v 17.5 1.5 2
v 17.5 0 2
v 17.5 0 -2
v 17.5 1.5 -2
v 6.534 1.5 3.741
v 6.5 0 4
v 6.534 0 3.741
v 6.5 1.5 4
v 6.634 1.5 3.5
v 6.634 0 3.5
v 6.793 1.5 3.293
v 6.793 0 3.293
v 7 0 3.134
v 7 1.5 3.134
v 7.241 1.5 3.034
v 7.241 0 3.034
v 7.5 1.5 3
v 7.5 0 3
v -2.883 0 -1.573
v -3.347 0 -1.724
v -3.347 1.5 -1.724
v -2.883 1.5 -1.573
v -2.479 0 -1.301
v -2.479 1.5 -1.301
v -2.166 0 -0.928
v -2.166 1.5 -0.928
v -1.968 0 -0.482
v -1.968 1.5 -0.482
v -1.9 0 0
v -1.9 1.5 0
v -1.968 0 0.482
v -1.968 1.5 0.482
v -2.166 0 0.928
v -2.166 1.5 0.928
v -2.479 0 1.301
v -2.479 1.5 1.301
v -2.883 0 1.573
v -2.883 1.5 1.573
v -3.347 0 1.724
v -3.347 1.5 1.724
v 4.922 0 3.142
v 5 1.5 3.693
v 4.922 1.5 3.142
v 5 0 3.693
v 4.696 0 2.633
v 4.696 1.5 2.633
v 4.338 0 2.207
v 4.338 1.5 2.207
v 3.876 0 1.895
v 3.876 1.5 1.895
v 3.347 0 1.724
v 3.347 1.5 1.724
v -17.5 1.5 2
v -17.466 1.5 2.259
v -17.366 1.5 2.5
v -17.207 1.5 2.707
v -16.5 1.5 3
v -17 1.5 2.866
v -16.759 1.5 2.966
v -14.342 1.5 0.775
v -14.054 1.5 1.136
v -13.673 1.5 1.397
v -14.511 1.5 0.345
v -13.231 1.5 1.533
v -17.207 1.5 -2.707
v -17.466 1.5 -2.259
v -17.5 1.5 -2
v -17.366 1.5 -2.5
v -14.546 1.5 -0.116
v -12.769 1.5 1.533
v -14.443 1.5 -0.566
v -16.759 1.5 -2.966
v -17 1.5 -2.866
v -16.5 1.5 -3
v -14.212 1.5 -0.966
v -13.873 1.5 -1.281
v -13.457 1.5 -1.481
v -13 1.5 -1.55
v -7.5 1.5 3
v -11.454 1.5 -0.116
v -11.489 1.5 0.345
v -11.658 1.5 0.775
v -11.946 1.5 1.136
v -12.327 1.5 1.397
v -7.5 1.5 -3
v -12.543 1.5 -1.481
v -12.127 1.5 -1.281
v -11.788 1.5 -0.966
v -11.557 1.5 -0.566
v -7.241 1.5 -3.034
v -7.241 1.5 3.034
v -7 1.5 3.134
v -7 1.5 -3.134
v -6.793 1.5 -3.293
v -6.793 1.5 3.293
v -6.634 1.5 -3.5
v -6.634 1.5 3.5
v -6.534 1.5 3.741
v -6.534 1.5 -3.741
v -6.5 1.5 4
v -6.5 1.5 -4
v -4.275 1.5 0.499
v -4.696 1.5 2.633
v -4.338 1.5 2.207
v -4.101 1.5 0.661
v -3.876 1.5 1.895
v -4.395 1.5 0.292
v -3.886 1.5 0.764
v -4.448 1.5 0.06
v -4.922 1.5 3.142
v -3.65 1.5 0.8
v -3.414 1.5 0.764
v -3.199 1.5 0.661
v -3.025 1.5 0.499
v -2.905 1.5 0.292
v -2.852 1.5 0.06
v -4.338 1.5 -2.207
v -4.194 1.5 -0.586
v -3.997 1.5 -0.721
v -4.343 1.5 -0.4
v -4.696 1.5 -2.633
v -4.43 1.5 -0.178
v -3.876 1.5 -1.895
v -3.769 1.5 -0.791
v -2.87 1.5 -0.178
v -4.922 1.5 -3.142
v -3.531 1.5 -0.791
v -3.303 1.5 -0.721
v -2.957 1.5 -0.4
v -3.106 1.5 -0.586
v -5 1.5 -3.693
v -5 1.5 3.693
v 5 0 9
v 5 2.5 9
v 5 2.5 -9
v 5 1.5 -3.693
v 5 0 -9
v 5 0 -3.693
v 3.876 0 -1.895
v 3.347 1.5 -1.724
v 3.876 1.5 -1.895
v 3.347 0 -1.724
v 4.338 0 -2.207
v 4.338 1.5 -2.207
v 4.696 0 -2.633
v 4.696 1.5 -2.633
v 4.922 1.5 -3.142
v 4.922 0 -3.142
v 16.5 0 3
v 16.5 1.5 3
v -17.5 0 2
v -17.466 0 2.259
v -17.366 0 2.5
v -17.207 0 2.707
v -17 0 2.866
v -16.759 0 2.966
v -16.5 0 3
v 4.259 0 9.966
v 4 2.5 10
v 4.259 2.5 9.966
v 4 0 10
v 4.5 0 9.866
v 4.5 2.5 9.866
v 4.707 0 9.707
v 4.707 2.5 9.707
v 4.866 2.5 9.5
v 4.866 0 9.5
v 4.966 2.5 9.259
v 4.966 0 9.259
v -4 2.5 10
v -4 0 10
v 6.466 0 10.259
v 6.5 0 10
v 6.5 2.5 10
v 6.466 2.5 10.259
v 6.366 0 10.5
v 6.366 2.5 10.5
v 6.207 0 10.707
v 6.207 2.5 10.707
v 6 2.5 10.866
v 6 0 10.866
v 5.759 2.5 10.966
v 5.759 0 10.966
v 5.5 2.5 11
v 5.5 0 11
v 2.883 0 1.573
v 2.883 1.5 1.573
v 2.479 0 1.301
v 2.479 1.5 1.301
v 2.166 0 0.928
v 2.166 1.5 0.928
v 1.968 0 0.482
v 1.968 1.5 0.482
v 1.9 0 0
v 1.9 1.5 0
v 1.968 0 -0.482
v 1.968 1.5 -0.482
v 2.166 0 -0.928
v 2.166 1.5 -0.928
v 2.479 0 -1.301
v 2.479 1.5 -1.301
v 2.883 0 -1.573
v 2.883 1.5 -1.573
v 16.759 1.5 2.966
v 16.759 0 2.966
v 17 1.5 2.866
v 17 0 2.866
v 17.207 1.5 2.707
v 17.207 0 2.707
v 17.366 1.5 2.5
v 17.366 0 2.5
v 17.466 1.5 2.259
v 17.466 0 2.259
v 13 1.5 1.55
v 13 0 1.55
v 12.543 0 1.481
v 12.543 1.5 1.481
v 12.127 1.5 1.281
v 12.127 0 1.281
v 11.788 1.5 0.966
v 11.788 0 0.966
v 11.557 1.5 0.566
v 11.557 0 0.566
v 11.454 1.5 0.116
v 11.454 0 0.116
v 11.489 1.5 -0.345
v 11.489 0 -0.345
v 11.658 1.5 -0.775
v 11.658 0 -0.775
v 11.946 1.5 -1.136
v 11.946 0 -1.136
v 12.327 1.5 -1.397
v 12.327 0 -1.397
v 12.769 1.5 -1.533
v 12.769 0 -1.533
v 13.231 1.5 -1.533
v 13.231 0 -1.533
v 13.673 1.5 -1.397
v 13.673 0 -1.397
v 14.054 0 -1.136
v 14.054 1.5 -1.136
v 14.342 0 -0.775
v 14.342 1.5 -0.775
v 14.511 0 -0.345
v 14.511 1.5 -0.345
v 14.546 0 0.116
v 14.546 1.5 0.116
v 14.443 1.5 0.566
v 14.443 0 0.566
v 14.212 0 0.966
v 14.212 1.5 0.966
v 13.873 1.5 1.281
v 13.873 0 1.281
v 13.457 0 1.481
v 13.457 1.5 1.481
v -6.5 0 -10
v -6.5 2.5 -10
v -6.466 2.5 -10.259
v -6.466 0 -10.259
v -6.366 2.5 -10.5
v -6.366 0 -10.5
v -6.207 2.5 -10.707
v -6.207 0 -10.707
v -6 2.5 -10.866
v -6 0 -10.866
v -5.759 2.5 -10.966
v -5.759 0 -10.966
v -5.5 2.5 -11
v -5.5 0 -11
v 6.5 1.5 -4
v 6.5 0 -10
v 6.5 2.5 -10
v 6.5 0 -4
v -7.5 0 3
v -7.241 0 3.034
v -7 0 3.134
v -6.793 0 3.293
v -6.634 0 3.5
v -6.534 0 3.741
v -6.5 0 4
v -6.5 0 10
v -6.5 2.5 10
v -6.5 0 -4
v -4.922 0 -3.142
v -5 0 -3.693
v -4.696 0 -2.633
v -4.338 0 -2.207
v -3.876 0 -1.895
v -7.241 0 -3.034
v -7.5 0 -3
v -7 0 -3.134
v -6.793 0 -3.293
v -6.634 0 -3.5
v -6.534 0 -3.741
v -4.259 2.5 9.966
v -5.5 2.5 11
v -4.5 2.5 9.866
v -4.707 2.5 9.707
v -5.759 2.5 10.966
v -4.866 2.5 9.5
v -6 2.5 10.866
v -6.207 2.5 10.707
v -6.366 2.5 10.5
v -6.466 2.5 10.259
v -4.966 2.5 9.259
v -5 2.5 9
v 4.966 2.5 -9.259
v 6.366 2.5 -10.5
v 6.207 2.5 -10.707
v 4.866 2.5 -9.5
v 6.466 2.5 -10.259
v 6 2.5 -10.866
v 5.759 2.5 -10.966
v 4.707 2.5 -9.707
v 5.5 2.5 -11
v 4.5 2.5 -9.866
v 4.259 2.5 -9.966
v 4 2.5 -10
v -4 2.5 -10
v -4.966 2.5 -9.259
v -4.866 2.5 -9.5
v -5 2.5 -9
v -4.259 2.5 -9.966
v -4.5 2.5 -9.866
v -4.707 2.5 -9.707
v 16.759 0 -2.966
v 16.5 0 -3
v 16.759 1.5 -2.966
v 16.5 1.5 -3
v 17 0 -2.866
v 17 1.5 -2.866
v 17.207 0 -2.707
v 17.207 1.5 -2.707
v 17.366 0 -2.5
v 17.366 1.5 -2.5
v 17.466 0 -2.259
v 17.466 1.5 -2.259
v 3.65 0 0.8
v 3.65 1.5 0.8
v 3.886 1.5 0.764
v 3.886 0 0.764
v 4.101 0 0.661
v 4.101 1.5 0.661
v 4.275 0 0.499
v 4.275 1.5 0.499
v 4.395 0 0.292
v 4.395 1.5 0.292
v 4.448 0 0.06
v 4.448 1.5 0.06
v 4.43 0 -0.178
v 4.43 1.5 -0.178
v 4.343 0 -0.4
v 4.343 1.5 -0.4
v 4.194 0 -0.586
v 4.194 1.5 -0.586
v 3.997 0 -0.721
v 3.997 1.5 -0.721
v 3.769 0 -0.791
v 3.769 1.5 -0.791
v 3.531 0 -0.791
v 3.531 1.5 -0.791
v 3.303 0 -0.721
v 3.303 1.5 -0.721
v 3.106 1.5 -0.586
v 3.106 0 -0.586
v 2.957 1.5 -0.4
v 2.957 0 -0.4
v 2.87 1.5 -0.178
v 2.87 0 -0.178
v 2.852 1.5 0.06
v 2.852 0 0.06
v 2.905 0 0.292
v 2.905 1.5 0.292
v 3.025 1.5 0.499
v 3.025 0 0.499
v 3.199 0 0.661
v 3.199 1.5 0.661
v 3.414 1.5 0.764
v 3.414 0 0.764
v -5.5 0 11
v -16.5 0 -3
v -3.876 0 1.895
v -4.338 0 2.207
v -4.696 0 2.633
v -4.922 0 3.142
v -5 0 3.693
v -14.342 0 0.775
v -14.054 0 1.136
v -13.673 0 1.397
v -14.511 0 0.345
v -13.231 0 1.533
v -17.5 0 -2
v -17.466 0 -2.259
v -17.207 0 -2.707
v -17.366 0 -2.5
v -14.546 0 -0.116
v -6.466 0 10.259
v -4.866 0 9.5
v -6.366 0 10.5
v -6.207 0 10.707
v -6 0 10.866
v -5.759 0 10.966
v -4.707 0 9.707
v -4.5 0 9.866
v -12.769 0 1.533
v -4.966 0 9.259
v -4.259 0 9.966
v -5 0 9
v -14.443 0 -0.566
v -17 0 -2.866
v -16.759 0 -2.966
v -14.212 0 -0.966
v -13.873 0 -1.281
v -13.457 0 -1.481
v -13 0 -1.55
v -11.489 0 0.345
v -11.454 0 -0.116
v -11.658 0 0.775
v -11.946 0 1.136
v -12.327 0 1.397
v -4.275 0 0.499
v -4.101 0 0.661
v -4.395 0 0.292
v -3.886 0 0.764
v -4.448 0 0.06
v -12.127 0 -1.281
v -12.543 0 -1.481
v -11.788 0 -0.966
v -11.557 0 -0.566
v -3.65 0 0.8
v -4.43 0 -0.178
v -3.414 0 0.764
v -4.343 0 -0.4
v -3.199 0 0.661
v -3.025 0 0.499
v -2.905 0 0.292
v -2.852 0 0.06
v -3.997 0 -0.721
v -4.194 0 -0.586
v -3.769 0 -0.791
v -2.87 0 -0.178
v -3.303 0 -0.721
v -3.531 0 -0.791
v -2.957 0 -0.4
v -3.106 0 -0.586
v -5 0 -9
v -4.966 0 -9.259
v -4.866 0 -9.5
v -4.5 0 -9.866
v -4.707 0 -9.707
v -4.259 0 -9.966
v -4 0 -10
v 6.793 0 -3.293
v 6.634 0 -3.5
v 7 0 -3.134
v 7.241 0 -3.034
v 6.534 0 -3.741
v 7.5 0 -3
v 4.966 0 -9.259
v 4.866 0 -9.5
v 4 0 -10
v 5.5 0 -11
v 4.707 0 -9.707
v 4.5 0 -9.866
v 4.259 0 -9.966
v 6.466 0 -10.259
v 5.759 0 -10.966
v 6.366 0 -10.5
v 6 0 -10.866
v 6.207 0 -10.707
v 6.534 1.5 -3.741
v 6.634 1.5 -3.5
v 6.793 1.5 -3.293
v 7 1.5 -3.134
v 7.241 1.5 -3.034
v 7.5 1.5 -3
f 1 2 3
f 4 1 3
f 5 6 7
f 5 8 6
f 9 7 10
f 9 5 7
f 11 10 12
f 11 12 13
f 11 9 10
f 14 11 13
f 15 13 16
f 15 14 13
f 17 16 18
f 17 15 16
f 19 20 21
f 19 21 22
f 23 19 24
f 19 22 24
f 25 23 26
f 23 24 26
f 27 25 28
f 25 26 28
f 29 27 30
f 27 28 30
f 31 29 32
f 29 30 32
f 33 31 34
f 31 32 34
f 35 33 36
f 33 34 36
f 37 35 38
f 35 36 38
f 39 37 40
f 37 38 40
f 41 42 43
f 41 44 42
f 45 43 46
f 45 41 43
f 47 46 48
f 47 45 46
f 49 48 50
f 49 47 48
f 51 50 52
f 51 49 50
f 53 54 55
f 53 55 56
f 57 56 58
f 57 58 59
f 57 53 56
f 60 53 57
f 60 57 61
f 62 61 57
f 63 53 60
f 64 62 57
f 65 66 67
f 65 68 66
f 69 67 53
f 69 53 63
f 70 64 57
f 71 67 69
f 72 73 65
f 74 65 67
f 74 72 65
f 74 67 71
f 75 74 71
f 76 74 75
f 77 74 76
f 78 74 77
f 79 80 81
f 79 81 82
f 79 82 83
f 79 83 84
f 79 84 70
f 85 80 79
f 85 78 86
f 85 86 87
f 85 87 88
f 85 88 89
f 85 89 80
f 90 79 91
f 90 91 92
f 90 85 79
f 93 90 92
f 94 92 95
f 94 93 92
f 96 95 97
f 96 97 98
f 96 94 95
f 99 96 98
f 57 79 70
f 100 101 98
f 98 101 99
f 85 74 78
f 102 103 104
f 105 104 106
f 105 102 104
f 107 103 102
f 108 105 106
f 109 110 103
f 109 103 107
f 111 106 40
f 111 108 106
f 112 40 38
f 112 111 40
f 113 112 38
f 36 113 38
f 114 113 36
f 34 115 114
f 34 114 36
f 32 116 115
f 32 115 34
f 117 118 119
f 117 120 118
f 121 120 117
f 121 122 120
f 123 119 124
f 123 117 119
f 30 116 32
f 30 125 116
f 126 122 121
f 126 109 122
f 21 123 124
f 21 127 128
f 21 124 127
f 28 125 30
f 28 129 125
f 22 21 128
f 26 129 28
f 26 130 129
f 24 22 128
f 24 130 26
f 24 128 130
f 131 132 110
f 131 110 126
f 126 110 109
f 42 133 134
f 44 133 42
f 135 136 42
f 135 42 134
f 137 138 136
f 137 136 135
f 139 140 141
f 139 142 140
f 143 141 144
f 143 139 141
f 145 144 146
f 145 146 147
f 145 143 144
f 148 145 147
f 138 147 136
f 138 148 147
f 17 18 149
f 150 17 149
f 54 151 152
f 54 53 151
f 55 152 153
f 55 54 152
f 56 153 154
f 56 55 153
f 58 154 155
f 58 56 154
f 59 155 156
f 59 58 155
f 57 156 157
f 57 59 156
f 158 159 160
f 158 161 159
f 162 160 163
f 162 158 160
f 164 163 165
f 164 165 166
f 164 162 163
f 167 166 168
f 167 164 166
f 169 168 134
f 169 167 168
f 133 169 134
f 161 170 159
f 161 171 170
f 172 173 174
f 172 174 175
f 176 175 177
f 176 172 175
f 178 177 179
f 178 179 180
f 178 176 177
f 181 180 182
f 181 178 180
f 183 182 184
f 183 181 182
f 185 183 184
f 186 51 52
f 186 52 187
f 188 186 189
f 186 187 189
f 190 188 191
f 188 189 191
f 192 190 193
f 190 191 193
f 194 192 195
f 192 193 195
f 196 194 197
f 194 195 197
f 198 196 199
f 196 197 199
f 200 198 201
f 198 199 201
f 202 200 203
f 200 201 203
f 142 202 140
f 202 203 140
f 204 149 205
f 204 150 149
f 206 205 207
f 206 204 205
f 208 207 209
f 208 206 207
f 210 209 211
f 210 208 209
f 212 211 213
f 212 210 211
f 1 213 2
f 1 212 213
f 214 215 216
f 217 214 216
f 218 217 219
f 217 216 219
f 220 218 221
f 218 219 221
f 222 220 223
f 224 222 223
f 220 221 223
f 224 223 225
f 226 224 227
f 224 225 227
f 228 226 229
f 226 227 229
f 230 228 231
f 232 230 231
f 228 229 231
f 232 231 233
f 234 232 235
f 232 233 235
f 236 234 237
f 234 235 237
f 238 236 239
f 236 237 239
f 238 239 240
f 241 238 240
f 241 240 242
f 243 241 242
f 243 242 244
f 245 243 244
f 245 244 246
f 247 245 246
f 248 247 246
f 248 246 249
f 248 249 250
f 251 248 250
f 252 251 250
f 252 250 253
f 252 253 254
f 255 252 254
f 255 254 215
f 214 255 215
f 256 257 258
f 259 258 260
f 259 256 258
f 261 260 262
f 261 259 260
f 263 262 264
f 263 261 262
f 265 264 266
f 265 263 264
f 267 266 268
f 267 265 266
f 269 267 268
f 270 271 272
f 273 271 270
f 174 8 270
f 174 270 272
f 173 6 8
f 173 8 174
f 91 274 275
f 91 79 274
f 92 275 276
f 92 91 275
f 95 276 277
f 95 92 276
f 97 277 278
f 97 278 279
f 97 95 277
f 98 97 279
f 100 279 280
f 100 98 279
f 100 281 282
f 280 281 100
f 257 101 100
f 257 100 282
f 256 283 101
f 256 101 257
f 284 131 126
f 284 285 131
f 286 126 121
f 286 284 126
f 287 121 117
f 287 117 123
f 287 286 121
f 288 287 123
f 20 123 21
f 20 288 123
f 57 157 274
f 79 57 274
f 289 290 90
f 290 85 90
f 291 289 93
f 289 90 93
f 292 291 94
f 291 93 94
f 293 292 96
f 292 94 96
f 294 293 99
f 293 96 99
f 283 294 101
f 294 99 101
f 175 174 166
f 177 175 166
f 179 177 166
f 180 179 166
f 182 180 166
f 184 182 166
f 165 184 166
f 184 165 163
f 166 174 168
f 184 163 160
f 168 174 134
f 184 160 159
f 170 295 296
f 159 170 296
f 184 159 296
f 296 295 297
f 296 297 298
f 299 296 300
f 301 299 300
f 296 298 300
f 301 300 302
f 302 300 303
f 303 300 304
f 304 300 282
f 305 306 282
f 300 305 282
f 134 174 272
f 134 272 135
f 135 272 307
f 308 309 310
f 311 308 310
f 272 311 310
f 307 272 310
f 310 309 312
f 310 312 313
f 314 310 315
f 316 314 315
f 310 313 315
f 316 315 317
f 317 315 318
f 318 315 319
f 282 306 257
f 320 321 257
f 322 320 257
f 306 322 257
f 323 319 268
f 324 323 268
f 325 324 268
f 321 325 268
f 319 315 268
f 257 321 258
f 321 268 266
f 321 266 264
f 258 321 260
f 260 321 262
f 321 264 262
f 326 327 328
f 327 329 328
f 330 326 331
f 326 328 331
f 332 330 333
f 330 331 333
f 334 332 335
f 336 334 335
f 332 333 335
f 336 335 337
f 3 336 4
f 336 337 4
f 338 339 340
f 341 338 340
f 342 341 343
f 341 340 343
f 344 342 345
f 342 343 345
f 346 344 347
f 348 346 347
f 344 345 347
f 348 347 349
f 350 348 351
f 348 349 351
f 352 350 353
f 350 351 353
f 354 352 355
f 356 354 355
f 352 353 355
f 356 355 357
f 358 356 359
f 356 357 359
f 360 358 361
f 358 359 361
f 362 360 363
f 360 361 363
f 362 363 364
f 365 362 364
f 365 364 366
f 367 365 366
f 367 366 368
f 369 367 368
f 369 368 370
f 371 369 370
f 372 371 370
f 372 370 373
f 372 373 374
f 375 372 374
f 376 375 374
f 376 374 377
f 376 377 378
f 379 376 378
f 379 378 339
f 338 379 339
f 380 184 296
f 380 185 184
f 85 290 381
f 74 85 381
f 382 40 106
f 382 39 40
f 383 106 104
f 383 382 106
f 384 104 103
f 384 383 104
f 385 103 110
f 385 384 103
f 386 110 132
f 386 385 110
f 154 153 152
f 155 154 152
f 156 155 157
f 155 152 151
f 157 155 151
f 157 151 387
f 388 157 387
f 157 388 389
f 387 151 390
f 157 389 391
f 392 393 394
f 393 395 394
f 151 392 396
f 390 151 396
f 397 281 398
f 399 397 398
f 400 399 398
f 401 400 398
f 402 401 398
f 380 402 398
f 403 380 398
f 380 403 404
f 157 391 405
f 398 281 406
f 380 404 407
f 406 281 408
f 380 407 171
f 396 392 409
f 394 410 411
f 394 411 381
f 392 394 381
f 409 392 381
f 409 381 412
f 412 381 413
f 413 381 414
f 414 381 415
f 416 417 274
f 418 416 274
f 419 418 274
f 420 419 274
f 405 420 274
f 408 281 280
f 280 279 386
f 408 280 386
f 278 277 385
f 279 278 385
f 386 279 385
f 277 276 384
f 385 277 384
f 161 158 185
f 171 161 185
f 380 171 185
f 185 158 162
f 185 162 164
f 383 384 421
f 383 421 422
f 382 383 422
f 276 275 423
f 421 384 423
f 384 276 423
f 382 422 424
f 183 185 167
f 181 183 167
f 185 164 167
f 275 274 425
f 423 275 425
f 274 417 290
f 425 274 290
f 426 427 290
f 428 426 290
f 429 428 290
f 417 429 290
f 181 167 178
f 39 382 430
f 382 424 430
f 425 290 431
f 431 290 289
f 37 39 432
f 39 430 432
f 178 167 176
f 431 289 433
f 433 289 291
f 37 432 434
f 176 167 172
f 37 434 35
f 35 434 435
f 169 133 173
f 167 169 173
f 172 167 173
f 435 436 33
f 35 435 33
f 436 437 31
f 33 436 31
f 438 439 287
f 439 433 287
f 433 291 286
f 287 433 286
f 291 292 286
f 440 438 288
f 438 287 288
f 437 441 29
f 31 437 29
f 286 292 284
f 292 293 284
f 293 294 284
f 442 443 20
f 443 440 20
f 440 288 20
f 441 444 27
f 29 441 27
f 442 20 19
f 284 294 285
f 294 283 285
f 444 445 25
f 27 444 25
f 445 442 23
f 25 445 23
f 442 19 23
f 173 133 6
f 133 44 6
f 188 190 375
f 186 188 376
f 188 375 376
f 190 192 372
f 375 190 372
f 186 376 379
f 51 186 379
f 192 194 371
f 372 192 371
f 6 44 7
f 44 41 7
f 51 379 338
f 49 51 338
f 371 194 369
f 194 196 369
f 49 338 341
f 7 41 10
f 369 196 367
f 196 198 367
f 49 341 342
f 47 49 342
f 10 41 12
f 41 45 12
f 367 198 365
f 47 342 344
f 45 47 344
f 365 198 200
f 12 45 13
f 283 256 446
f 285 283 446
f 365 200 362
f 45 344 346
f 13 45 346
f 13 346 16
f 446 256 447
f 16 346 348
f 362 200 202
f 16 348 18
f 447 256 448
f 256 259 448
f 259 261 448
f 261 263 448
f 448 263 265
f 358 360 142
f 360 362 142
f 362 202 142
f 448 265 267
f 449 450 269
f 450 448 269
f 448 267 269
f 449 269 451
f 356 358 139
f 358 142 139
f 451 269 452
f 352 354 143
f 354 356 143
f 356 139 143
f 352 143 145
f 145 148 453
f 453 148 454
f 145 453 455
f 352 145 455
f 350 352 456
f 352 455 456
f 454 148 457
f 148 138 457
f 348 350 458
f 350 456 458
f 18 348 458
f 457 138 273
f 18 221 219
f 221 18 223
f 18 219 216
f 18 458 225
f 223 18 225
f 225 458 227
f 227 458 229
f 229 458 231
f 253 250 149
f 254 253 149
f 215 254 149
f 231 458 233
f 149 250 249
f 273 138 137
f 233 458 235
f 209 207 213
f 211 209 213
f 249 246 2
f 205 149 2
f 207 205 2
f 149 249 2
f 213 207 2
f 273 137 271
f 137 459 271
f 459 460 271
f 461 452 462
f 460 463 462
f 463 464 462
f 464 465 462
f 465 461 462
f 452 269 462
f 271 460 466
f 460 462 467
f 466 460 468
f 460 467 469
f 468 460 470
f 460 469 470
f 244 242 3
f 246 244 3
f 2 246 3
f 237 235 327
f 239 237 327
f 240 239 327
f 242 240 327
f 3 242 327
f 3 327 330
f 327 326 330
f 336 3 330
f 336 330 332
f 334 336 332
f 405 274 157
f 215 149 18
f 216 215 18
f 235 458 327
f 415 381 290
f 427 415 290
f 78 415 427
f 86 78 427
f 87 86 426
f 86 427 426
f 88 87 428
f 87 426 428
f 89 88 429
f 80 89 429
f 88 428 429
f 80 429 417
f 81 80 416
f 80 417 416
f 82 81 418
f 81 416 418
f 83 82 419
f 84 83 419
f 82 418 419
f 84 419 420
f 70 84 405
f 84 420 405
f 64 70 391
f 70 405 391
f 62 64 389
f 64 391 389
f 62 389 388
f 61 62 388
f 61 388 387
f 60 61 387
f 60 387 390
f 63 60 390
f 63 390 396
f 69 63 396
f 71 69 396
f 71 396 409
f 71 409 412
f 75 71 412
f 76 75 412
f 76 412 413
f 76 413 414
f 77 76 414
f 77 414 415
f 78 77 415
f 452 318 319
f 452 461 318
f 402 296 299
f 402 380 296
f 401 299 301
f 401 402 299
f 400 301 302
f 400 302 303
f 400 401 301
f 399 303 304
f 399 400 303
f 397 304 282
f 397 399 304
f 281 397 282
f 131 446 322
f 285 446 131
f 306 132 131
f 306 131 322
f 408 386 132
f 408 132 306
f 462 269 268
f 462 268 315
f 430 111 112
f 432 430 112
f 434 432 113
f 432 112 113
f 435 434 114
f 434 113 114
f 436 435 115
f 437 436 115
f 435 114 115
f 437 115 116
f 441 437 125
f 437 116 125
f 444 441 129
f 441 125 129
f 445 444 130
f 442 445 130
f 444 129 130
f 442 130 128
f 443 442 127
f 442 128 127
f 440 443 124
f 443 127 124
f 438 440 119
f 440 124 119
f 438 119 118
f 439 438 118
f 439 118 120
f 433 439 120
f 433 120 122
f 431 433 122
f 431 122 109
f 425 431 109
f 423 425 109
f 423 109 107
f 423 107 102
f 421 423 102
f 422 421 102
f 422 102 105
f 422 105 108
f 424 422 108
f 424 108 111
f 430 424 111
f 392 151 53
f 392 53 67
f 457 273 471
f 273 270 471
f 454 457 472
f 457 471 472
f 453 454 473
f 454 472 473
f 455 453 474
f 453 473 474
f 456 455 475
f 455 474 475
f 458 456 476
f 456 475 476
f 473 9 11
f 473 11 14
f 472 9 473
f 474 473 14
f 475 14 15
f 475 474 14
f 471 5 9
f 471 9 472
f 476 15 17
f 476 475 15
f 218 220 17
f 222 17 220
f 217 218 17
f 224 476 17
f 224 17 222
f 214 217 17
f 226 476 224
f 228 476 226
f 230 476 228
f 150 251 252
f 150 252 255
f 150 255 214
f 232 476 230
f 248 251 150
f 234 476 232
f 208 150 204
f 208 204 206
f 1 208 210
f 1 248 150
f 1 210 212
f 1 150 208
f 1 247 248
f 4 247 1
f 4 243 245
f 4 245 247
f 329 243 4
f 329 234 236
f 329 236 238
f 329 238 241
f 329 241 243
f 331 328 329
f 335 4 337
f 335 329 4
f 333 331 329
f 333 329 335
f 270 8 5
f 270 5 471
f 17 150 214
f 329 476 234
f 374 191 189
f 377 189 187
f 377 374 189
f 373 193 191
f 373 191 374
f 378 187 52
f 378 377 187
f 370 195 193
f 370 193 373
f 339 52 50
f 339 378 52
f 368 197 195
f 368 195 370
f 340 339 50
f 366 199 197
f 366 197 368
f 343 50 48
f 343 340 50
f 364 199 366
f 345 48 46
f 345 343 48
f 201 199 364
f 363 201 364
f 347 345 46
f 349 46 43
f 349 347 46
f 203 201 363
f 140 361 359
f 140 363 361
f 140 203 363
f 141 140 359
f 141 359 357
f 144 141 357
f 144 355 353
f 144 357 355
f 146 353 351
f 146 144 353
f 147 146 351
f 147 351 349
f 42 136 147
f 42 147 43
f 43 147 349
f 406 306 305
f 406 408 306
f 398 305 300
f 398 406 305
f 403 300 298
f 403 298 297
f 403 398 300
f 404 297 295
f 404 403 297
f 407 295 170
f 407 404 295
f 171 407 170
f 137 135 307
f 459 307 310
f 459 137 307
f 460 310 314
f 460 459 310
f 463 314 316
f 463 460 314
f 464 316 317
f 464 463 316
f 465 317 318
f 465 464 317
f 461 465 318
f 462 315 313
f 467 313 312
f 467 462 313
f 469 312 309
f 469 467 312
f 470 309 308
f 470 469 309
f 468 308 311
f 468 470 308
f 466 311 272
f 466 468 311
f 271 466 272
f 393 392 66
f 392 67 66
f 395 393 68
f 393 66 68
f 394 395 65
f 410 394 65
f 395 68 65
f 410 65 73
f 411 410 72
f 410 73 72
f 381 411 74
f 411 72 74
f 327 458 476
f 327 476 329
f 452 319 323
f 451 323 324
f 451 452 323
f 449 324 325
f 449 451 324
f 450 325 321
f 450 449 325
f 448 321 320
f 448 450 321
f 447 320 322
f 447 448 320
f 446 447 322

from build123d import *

# Parameters (mm, degrees)
SKETCH_1_W          = 11
SKETCH_1_H          = 6
SKETCH_1_W_2        = 13
SKETCH_1_H_2        = 8
EXTRUDE_1_DEPTH     = 1.5
CUT_EXTRUDE_1_DEPTH = 1.5
FILLET_1_R          = 2
FILLET_2_R          = 1
SKETCH_3_R          = 0.8
CUT_EXTRUDE_2_DEPTH = 10
EXTRUDE_2_DEPTH     = 1
SKETCH_5_R          = 1.55
CUT_EXTRUDE_3_DEPTH = 10


with BuildPart() as part:
    # 草图1 → 凸台-拉伸1 (new body)
    with BuildSketch(Plane(origin=(0, 0, 0), x_dir=(1, 0, 0), z_dir=(0, 1, 0))):
        with Locations((-12, 0)):
            Rectangle(SKETCH_1_W, SKETCH_1_H)
        with Locations((0, -7)):
            Rectangle(SKETCH_1_W_2, SKETCH_1_H_2)
        Rectangle(SKETCH_1_W_2, SKETCH_1_H)
        with Locations((0, 7)):
            Rectangle(SKETCH_1_W_2, SKETCH_1_H_2)
        with Locations((12, 0)):
            Rectangle(SKETCH_1_W, SKETCH_1_H)
    extrude(amount=EXTRUDE_1_DEPTH)

    # 草图2 → 切除-拉伸1 (cut)
    with BuildSketch(Plane(origin=(0, 1.5, 0), x_dir=(1, 0, 0), z_dir=(0, 1, 0))):
        with BuildLine():
            Line((-5, -10), (5, -10))
            Line((5, -10), (5, -1.113552873))
            ThreePointArc((5, -1.113552873), (1.9, 0), (5, 1.113552873))
            Line((5, 1.113552873), (5, 10))
            Line((5, 10), (-5, 10))
            Line((-5, 10), (-5, 1.113552873))
            ThreePointArc((-5, 1.113552873), (-1.9, 0), (-5, -1.113552873))
            Line((-5, -1.113552873), (-5, -10))
        make_face()
    extrude(amount=-CUT_EXTRUDE_1_DEPTH, mode=Mode.SUBTRACT)

    # 圆角1
    fillet_1_edges = [part.edges().sort_by_distance(p)[0] for p in [
        (5, 0.75, -1.113552873),
        (5, 0.75, 1.113552873),
        (-5, 0.75, 1.113552873),
        (-5, 0.75, -1.113552873),
    ]]
    fillet(fillet_1_edges, radius=FILLET_1_R)

    # 圆角2
    fillet_2_edges = [part.edges().sort_by_distance(p)[0] for p in [
        (-6.5, 0.75, -3),
        (-6.5, 0.75, -11),
        (6.5, 0.75, -11),
        (6.5, 0.75, -3),
        (17.5, 0.75, -3),
        (17.5, 0.75, 3),
        (6.5, 0.75, 3),
        (6.5, 0.75, 11),
        (-6.5, 0.75, 11),
        (-6.5, 0.75, 3),
        (-17.5, 0.75, 3),
        (-17.5, 0.75, -3),
        (5, 0.75, -10),
        (5, 0.75, 10),
        (-5, 0.75, 10),
        (-5, 0.75, -10),
    ]]
    fillet(fillet_2_edges, radius=FILLET_2_R)

    # 草图3 → 切除-拉伸2 (cut)
    with BuildSketch(Plane(origin=(0, 1.5, 0), x_dir=(1, 0, 0), z_dir=(0, 1, 0))):
        with Locations(Location((-3.65, 0, 0), (0, 0, 270))):
            Circle(SKETCH_3_R)
        with Locations(Location((3.65, 0, 0), (0, 0, 270))):
            Circle(SKETCH_3_R)
    extrude(amount=-CUT_EXTRUDE_2_DEPTH, mode=Mode.SUBTRACT)

    # 草图4 → 凸台-拉伸2 (add)
    with BuildSketch(Plane(origin=(0, 1.5, 0), x_dir=(1, 0, 0), z_dir=(0, 1, 0))):
        with BuildLine():
            Line((-6.5, -4), (-6.5, 4))
            Line((-6.5, 4), (-6.5, 10))
            ThreePointArc((-6.5, 10), (-6.207106781, 10.707106781), (-5.5, 11))
            Line((-5.5, 11), (5.5, 11))
            ThreePointArc((5.5, 11), (6.207106781, 10.707106781), (6.5, 10))
            Line((6.5, 10), (6.5, 4))
            Line((6.5, 4), (6.5, -4))
            Line((6.5, -4), (6.5, -10))
            ThreePointArc((6.5, -10), (6.207106781, -10.707106781), (5.5, -11))
            Line((5.5, -11), (-5.5, -11))
            ThreePointArc((-5.5, -11), (-6.207106781, -10.707106781), (-6.5, -10))
            Line((-6.5, -10), (-6.5, -4))
        make_face()
        with BuildLine():
            Line((5, -3.693237063), (5, 9))
            ThreePointArc((5, 9), (4.707106781, 9.707106781), (4, 10))
            Line((4, 10), (-4, 10))
            ThreePointArc((-4, 10), (-4.707106781, 9.707106781), (-5, 9))
            Line((-5, 9), (-5, -3.693237063))
            Line((-5, -3.693237063), (-5, -9))
            ThreePointArc((-5, -9), (-4.707106781, -9.707106781), (-4, -10))
            Line((-4, -10), (4, -10))
            ThreePointArc((4, -10), (4.707106781, -9.707106781), (5, -9))
            Line((5, -9), (5, -3.693237063))
        make_face(mode=Mode.SUBTRACT)
    extrude(amount=EXTRUDE_2_DEPTH)

    # 草图5 → 切除-拉伸3 (cut)
    with BuildSketch(Plane.XZ):
        with Locations(Location((-13, 0, 0), (0, 0, 270))):
            Circle(SKETCH_5_R)
        with Locations(Location((13, 0, 0), (0, 0, 90))):
            Circle(SKETCH_5_R)
    extrude(amount=-CUT_EXTRUDE_3_DEPTH, mode=Mode.SUBTRACT)


solid = part.part
